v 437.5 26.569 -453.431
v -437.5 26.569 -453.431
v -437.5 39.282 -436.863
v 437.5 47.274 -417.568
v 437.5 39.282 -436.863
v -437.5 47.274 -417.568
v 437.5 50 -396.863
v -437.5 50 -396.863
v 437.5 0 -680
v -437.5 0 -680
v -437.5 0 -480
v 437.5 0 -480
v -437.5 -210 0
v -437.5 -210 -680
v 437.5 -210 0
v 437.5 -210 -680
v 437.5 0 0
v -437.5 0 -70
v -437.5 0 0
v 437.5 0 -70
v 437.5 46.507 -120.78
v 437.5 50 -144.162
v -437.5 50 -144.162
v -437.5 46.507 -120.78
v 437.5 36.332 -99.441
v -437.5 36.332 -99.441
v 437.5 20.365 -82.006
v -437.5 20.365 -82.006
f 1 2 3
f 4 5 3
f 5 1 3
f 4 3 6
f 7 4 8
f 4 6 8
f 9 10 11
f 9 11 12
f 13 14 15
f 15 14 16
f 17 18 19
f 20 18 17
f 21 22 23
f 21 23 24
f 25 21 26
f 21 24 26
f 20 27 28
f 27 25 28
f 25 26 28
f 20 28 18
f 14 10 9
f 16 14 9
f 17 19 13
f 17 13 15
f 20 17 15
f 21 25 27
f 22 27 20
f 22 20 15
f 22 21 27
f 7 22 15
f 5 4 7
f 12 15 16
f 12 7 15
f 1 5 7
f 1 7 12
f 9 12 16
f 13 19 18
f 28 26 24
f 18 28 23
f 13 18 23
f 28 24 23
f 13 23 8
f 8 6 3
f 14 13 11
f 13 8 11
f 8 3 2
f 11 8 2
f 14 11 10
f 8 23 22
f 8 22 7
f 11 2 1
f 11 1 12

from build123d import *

# Parameters (mm, degrees)
SKETCH1_W           = 875
SKETCH1_H           = 680
BOSS_EXTRUDE1_DEPTH = 210
BOSS_EXTRUDE2_DEPTH = 875
FILLET1_R           = 80


with BuildPart() as part:
    # Sketch1 → Boss-Extrude1 (new body)
    with BuildSketch(Plane(origin=(0, 0, 0), x_dir=(1, 0, 0), z_dir=(0, 1, 0))):
        with Locations((0, 340)):
            Rectangle(SKETCH1_W, SKETCH1_H)
    extrude(amount=-BOSS_EXTRUDE1_DEPTH)

    # Sketch3 → Boss-Extrude2 (add)
    with BuildSketch(Plane.ZY.offset(437.5)):
        Polygon((-70, 0), (-70, 50), (-430, 50), (-480, 0), align=None)
    extrude(amount=-BOSS_EXTRUDE2_DEPTH)

    # Fillet1
    # the kernel refuses this fillet: 80 mm, written as the material it takes off along each edge
    with BuildSketch(Plane(origin=(-622.904962177, 50, -70), x_dir=(0, -1, 0), z_dir=(1, 0, 0))) as fillet1_piece_1:
        with BuildLine():
            CenterArc((80, 74.161984871), FILLET1_R, 180, 67.975687163)
            Line((0, 74.161984871), (-1.6, 74.161984871))
            Line((-1.6, 74.161984871), (-1.6, 0))
            Line((-1.6, 0), (0, -1.6))
            ThreePointArc((0, -1.6), (25, -1.6), (49.4, -1.483239697))
            Line((49.4, -1.483239697), (50, 0))
        make_face()
    extrude(amount=1245.809924355, mode=Mode.SUBTRACT)
    with BuildSketch(Plane(origin=(-520.342712475, 50, -430), x_dir=(0, -0.7071067811865477, -0.7071067811865474), z_dir=(1, 0, 0))) as fillet1_piece_2:
        with BuildLine():
            CenterArc((FILLET1_R * 0.414213562373, -FILLET1_R), FILLET1_R, 90, 45)
            Line((-FILLET1_R * 0.292893218813, -FILLET1_R * 0.292893218813), (-FILLET1_R * 0.307035354437, -FILLET1_R * 0.27875108319))
            Line((-FILLET1_R * 0.307035354437, -FILLET1_R * 0.27875108319), (-FILLET1_R * 0.00828427124746, FILLET1_R * 0.02))
            Line((-FILLET1_R * 0.00828427124746, FILLET1_R * 0.02), (FILLET1_R * 0.414213562373, FILLET1_R * 0.02))
            Line((FILLET1_R * 0.414213562373, FILLET1_R * 0.02), (FILLET1_R * 0.414213562373, 0))
        make_face()
    extrude(amount=1040.685424949, mode=Mode.SUBTRACT)


solid = part.part
